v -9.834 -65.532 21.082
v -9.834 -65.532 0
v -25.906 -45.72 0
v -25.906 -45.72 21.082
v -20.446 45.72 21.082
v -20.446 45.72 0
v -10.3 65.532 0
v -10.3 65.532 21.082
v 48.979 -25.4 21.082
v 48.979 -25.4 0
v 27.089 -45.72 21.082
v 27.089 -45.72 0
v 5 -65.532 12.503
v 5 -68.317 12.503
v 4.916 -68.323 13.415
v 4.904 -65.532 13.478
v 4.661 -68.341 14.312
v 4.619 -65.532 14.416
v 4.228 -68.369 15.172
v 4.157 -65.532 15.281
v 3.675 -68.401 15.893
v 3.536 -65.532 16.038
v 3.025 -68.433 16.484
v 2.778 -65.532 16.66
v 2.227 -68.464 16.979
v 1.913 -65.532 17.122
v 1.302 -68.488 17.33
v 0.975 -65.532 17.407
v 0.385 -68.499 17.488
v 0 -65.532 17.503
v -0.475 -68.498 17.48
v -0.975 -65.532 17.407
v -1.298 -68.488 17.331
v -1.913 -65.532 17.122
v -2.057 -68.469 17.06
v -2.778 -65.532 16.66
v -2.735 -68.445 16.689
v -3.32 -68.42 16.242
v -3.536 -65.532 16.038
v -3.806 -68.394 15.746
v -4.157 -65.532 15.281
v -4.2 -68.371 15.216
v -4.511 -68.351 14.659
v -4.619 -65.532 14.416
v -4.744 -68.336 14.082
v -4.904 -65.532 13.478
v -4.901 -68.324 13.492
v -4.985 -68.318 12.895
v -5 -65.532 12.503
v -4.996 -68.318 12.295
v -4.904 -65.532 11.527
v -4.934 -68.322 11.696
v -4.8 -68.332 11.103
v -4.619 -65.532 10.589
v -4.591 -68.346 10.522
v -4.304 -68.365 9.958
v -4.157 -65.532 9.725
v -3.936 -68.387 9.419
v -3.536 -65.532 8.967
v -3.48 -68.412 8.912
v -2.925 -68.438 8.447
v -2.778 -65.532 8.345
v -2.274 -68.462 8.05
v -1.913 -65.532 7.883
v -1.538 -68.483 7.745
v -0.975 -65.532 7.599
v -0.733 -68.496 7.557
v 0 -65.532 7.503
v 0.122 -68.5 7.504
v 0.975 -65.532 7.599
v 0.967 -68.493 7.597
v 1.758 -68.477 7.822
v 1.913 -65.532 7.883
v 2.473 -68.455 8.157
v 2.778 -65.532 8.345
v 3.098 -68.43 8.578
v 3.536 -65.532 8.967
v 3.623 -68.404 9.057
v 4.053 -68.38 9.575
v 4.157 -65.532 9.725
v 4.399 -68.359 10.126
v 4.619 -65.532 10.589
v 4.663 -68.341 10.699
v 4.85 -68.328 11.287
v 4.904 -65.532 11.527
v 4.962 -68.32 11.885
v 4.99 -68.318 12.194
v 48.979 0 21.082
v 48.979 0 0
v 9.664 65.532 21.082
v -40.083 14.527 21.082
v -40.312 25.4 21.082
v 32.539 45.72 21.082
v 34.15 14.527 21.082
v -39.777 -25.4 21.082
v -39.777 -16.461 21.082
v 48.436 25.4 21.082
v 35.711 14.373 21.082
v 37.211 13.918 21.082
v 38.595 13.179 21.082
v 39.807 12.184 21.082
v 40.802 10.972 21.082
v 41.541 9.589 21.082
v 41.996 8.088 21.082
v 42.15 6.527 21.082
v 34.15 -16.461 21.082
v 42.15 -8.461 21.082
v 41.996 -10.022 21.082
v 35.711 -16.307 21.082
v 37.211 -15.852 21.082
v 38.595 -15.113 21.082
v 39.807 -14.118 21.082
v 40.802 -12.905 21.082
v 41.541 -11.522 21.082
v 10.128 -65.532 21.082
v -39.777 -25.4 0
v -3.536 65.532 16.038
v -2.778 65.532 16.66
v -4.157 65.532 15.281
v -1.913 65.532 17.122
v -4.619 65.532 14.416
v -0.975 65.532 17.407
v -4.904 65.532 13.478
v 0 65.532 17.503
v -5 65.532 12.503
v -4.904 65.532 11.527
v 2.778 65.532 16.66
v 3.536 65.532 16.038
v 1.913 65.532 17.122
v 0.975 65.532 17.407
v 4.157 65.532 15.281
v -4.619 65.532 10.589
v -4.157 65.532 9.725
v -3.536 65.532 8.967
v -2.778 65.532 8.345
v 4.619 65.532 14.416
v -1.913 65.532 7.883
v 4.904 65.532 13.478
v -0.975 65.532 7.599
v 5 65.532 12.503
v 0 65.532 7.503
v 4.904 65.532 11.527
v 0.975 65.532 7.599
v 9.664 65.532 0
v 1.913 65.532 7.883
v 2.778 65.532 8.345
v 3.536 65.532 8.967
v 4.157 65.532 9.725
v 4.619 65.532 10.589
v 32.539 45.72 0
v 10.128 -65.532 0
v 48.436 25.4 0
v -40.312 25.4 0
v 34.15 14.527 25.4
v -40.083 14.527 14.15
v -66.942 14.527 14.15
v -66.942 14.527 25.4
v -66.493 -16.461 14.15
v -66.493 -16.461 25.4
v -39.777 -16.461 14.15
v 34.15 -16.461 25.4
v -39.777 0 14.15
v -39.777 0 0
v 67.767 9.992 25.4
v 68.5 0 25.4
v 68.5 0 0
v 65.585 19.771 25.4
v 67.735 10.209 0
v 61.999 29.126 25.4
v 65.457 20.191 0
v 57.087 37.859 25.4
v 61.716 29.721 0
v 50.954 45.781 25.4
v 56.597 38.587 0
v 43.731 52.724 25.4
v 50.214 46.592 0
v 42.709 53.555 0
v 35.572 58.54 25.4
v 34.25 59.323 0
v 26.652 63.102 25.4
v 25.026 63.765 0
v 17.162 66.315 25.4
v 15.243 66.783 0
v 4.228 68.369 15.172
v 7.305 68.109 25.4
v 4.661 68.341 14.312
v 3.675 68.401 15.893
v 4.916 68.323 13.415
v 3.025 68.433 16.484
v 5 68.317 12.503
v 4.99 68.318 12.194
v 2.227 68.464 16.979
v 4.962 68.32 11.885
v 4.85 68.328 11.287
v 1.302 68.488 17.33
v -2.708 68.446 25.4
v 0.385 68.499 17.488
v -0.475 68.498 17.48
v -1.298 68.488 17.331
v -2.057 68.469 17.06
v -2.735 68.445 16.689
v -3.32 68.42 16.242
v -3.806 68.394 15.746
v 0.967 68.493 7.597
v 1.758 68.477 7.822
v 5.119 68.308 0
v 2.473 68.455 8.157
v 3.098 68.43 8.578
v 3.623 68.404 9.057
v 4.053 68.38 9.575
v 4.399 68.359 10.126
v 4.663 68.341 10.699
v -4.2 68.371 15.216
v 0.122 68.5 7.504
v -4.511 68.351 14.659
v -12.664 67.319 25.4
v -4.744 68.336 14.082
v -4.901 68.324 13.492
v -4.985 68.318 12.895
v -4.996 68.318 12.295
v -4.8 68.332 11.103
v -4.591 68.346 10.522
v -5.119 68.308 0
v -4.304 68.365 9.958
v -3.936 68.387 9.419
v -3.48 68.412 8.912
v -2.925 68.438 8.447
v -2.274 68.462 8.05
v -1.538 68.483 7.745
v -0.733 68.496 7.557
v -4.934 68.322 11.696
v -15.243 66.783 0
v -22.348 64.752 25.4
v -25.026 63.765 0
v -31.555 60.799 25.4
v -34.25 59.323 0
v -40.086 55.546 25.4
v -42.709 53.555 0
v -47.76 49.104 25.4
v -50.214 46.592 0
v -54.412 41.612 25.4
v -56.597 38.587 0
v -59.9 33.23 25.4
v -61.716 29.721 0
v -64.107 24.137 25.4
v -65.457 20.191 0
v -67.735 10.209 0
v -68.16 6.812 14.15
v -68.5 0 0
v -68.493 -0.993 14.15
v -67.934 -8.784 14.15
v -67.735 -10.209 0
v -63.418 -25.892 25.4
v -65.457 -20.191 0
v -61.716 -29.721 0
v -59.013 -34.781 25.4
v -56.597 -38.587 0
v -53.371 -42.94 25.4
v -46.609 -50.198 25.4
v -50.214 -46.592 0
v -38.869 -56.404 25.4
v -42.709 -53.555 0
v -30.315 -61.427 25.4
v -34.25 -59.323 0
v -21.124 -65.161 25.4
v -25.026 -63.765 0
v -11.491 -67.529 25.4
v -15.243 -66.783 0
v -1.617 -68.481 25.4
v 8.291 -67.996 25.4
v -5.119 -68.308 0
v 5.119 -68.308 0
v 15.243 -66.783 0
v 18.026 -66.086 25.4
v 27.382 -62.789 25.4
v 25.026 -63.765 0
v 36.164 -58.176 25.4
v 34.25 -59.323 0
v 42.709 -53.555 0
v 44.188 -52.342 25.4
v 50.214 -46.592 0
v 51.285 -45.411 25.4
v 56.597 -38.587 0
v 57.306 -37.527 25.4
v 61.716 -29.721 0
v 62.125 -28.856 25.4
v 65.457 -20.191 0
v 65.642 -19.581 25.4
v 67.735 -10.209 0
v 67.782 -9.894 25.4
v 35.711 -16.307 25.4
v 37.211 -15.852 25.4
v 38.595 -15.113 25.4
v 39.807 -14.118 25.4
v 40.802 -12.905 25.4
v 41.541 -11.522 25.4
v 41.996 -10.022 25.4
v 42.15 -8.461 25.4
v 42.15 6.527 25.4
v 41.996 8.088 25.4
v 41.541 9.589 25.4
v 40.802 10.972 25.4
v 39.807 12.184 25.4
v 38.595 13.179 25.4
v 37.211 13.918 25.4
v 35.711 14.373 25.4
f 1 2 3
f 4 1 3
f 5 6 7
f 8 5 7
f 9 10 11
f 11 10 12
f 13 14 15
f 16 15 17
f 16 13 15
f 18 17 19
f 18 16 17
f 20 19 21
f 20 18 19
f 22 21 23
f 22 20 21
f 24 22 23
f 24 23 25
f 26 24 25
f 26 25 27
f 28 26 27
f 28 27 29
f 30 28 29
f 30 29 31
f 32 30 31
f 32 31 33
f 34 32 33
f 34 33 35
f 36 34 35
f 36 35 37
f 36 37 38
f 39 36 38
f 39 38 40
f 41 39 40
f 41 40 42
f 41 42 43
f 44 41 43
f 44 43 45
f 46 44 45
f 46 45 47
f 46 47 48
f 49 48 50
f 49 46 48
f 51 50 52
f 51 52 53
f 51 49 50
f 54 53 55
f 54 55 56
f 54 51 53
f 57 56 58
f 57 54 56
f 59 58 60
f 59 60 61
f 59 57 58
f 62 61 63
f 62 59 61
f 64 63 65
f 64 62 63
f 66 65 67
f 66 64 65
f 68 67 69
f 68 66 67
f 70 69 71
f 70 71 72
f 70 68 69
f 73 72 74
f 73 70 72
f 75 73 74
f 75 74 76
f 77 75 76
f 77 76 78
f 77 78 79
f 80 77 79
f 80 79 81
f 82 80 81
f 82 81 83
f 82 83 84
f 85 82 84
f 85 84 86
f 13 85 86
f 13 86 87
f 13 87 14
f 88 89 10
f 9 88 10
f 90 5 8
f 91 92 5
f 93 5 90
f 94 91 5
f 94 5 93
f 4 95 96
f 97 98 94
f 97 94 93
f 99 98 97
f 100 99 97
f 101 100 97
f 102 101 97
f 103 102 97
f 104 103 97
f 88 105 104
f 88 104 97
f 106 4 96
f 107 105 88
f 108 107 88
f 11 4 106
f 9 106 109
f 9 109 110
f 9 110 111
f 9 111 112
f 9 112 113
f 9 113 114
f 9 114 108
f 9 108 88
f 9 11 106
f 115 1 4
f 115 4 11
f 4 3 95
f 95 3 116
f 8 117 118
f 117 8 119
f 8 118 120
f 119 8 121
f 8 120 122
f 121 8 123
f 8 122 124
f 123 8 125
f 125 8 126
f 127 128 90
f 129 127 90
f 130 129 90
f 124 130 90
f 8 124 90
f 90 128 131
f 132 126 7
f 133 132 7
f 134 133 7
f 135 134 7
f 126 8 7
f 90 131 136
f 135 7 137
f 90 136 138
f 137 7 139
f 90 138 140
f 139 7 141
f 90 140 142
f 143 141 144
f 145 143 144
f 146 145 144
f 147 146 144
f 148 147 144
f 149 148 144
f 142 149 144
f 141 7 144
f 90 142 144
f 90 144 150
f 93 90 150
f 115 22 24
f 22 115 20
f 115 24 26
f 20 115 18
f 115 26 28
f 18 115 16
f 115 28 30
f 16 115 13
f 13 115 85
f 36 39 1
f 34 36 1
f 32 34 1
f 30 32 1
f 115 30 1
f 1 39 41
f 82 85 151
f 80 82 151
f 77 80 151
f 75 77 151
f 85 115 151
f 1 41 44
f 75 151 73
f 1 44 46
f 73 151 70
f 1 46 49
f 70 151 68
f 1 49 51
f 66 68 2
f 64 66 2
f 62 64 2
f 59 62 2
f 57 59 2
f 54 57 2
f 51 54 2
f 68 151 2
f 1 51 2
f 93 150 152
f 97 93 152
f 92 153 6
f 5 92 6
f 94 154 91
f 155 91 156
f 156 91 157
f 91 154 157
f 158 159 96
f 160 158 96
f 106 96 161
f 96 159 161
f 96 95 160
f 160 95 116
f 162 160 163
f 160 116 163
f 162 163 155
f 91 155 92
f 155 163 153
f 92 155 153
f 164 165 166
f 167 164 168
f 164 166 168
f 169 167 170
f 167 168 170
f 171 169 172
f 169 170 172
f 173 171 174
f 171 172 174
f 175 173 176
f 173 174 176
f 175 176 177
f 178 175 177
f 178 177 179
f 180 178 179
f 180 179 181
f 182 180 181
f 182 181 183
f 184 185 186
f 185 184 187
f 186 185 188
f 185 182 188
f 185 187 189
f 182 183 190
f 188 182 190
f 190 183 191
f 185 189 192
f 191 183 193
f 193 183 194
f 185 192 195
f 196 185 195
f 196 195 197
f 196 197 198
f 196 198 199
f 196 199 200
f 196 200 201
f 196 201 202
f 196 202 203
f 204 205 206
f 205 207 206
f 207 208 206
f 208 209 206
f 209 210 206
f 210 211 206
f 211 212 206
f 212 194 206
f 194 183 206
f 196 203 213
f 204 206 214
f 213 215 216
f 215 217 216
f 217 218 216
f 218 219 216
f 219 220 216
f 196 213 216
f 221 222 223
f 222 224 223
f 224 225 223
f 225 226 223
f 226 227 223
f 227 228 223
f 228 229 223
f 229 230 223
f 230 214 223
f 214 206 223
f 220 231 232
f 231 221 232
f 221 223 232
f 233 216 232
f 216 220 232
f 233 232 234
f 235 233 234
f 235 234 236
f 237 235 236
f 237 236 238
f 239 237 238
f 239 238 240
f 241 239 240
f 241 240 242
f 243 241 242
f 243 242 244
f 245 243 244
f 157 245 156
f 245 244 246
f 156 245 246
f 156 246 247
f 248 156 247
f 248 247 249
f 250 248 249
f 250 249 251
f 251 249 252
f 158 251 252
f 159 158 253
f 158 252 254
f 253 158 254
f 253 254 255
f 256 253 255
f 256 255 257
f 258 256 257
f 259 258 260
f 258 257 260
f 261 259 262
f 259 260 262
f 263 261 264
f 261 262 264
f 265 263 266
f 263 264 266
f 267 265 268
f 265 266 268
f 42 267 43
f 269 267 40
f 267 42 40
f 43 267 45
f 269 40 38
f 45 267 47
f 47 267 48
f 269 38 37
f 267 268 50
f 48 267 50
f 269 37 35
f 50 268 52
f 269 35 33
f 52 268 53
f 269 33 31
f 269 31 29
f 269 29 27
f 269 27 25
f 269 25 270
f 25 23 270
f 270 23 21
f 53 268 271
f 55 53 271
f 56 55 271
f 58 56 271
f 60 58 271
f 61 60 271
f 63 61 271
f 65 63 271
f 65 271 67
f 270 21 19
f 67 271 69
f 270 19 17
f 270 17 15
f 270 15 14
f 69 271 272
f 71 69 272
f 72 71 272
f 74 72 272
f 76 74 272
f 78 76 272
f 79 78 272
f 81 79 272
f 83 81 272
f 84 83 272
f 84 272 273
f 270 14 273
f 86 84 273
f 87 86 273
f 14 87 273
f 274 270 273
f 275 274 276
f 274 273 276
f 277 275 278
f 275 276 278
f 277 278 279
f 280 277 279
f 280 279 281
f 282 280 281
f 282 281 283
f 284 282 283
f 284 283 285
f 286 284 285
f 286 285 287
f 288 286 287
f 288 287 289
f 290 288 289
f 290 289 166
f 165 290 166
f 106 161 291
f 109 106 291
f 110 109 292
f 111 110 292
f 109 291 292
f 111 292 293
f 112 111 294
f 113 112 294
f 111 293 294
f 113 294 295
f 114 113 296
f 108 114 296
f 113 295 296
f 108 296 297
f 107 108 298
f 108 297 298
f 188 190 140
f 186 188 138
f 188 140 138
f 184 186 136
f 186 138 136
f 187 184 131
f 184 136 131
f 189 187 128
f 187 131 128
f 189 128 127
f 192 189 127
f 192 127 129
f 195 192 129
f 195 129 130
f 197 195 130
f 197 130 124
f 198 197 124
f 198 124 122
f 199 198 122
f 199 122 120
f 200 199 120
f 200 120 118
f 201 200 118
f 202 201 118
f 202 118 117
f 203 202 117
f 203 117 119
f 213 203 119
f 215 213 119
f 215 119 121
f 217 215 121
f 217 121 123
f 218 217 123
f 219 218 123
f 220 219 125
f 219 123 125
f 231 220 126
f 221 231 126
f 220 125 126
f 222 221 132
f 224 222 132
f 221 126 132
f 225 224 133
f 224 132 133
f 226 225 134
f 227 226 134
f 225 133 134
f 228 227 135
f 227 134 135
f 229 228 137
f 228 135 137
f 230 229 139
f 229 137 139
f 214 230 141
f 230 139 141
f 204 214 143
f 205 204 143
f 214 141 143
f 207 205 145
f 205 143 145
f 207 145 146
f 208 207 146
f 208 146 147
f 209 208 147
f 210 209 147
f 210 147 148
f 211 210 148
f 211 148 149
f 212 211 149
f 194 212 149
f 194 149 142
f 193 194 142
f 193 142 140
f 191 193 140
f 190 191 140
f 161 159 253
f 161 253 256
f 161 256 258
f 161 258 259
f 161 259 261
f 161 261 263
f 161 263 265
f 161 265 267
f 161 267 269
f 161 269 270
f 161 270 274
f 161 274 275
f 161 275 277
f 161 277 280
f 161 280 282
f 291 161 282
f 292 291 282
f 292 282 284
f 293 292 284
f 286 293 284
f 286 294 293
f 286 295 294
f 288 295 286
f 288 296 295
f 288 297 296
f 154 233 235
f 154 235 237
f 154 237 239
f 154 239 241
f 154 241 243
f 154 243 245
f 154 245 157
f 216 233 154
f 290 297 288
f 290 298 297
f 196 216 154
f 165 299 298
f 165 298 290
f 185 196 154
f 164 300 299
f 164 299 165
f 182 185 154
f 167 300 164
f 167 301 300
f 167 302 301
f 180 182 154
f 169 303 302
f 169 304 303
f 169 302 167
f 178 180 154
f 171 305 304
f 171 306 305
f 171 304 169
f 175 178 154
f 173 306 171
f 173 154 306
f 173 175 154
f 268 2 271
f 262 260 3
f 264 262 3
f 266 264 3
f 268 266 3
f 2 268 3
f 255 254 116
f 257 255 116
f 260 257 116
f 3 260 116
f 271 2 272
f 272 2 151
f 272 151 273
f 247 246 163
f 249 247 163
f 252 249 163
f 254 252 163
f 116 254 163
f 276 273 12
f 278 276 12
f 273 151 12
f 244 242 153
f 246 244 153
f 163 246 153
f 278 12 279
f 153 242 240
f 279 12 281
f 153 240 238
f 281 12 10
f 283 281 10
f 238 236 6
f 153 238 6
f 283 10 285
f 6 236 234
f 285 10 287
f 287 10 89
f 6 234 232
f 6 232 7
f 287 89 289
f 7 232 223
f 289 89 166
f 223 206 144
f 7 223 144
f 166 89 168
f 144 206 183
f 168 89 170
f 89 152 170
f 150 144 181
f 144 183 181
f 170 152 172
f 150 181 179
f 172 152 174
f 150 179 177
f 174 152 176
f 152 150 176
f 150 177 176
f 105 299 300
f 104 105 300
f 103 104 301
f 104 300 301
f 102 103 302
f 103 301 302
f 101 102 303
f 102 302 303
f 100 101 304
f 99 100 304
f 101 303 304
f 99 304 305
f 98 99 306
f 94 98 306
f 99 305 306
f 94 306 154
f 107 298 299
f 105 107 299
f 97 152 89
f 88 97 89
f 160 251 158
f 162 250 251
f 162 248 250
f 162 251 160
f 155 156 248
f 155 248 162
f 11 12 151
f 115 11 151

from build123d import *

# Parameters (mm, degrees)
F0_R          = 68.5
F1_DEPTH      = 25.4
F3_DEPTH      = 11.25
F6_DEPTH      = 21.082
F4_R          = 5
F7_DEPTH      = 68.501
F7_DEPTH_BACK = 68.501


with BuildPart() as f1:
    # F0 (on Top) → F1 (new body)
    with BuildSketch(Plane.XY):
        Circle(F0_R)
    extrude(amount=F1_DEPTH)

    # F2 (on face) → F3 (cut)
    with BuildSketch(Plane.XY.offset(25.4)):
        with BuildLine():
            Line((34.15, 14.5270901566), (-88.2992463768, 14.5270901566))
            Line((-88.2992463768, 14.5270901566), (-88.2992463768, -16.4609098434))
            Line((-88.2992463768, -16.4609098434), (34.15, -16.4609098434))
            ThreePointArc((34.15, -16.4609098434), (39.8068542495, -14.1177640929), (42.15, -8.4609098434))
            Line((42.15, -8.4609098434), (42.15, 6.5270901566))
            ThreePointArc((42.15, 6.5270901566), (39.8068542495, 12.183944406), (34.15, 14.5270901566))
        make_face()
    extrude(amount=-F3_DEPTH, mode=Mode.SUBTRACT)

    # F5 (on face) → F6 (cut)
    with BuildSketch(Plane(origin=(0, 0, 0), x_dir=(1, 0, 0), z_dir=(0, 0, -1))):
        Polygon((10.1280519739, 65.532), (-9.8341628909, 65.532), (-25.9055476636, 45.72), (-39.7767797112, 25.4), (-39.7767797112, 0), (-40.3115227818, -25.4), (-20.4457305372, -45.72), (-10.3001166135, -65.532), (9.6642833865, -65.532), (32.5386694628, -45.72), (48.4360772182, -25.4), (48.9794053137, 0), (48.9794053137, 25.4), (27.0890761167, 45.72), align=None)
    extrude(amount=-F6_DEPTH, mode=Mode.SUBTRACT)

    # F4 (on Front) → F7 (cut, two sides)
    with BuildSketch(Plane.XZ) as f7_sk:
        with Locations((0, 12.5027870712)):
            Circle(F4_R)
    extrude(amount=-F7_DEPTH, mode=Mode.SUBTRACT)
    extrude(f7_sk.sketch, amount=F7_DEPTH_BACK, mode=Mode.SUBTRACT)


solid = f1.part
